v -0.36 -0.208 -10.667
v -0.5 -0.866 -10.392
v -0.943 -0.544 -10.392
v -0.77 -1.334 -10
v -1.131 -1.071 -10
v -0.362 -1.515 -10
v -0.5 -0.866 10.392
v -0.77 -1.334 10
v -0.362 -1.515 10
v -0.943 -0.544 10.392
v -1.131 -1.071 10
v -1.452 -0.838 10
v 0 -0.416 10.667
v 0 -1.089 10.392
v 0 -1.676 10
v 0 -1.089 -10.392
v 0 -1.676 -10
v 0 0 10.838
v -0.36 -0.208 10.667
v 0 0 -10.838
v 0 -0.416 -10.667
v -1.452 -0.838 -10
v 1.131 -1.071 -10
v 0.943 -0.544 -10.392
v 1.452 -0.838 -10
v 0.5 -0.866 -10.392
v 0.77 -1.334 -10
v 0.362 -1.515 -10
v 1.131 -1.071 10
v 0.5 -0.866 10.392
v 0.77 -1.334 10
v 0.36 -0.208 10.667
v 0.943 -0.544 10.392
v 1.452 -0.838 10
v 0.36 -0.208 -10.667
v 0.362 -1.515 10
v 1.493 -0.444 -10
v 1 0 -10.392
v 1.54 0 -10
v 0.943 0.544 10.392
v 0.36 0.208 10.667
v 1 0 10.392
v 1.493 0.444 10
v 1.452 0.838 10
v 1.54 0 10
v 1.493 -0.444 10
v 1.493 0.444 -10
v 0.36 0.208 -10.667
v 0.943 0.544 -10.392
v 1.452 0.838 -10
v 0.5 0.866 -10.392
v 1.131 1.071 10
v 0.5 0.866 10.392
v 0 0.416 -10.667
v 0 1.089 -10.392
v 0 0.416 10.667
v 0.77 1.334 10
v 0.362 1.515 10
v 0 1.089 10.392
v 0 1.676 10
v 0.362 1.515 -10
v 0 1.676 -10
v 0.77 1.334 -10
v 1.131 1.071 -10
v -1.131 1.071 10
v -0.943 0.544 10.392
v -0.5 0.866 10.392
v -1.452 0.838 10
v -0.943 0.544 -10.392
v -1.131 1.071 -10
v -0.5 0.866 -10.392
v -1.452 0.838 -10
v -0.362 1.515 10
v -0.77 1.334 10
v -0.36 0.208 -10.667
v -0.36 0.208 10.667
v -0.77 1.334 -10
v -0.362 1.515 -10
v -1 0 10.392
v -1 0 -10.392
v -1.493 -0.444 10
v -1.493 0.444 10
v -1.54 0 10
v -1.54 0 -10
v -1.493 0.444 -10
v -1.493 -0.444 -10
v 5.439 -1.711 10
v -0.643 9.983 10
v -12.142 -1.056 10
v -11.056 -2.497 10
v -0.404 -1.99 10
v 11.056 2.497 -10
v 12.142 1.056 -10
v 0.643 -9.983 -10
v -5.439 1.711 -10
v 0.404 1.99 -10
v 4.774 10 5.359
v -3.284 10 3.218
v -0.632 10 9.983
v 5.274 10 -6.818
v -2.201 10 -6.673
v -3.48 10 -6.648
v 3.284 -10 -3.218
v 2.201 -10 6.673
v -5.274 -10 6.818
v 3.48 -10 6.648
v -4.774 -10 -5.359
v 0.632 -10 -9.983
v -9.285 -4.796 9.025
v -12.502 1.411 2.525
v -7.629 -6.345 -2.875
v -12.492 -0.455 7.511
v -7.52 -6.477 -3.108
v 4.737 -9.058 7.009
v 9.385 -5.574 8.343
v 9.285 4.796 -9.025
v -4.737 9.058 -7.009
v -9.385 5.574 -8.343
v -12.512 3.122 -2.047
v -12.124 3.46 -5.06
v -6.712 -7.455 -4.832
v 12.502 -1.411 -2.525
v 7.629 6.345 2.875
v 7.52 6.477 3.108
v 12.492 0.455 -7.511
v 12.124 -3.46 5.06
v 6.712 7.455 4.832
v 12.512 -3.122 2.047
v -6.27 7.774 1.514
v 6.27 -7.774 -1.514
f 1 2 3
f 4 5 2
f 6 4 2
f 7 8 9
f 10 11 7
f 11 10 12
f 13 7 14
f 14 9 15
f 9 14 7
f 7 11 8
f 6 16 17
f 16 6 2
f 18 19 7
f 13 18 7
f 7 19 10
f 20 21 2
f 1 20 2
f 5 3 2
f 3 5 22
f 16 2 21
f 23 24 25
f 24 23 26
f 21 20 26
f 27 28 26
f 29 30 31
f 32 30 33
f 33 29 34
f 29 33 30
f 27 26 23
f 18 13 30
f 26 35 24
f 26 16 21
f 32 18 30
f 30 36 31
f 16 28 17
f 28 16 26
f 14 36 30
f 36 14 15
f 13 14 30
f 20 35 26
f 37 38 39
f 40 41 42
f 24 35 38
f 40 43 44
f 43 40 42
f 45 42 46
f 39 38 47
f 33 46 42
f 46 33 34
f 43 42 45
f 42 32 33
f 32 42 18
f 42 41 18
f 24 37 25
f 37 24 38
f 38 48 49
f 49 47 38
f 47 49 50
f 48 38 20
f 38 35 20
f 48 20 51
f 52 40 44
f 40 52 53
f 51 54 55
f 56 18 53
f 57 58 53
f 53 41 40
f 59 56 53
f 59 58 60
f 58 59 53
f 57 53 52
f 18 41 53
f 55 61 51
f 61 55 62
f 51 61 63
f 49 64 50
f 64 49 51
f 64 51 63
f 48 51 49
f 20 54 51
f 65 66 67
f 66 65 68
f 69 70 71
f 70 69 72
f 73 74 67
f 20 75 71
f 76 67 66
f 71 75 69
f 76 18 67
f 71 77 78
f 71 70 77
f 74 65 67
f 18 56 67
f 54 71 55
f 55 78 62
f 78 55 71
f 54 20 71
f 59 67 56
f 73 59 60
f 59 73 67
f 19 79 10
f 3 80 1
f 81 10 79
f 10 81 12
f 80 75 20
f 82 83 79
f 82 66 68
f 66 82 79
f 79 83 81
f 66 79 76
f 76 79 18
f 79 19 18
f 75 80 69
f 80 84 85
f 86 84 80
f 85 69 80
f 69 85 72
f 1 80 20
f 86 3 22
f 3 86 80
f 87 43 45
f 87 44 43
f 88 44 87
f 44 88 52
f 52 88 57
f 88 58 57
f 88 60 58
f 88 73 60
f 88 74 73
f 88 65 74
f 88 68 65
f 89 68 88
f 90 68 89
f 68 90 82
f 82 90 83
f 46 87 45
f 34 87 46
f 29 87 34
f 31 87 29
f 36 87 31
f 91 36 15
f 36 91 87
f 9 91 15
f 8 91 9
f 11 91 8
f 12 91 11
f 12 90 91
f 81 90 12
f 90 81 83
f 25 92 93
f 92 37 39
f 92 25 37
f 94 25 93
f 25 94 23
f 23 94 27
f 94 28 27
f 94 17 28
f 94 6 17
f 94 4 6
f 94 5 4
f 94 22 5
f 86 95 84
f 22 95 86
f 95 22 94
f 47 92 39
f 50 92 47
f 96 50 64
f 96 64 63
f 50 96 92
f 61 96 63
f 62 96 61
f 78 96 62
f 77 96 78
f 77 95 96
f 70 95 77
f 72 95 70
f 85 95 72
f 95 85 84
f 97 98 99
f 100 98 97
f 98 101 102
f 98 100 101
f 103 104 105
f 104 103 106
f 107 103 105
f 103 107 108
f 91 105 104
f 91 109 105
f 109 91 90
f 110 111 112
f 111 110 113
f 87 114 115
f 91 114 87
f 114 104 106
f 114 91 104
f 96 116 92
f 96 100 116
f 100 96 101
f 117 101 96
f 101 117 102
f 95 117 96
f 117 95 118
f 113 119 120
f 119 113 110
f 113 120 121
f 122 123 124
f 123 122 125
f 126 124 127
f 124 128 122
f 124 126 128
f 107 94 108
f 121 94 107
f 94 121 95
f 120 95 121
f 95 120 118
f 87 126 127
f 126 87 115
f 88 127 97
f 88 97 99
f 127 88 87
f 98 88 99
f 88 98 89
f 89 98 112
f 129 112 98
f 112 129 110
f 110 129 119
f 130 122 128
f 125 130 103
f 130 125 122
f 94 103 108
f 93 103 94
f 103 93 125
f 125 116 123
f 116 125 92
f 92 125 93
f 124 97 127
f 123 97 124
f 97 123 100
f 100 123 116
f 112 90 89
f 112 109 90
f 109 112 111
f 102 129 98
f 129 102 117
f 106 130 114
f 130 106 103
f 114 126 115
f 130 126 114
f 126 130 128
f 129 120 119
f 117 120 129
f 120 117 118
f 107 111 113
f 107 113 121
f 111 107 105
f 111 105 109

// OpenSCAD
intersection_for(n = [1 : 6])
{
    rotate([0, 0, n * 60])
        {
            translate([5,0,0])
                sphere(r=12);
        }
}

intersection_for(i = [ [  0,  0,   0],
        [ 10, 20, 300],
        [200, 40,  57],
        [ 20, 88,  57] ])
{
    rotate(i)
        cube([100, 20, 20], center = true);
}
